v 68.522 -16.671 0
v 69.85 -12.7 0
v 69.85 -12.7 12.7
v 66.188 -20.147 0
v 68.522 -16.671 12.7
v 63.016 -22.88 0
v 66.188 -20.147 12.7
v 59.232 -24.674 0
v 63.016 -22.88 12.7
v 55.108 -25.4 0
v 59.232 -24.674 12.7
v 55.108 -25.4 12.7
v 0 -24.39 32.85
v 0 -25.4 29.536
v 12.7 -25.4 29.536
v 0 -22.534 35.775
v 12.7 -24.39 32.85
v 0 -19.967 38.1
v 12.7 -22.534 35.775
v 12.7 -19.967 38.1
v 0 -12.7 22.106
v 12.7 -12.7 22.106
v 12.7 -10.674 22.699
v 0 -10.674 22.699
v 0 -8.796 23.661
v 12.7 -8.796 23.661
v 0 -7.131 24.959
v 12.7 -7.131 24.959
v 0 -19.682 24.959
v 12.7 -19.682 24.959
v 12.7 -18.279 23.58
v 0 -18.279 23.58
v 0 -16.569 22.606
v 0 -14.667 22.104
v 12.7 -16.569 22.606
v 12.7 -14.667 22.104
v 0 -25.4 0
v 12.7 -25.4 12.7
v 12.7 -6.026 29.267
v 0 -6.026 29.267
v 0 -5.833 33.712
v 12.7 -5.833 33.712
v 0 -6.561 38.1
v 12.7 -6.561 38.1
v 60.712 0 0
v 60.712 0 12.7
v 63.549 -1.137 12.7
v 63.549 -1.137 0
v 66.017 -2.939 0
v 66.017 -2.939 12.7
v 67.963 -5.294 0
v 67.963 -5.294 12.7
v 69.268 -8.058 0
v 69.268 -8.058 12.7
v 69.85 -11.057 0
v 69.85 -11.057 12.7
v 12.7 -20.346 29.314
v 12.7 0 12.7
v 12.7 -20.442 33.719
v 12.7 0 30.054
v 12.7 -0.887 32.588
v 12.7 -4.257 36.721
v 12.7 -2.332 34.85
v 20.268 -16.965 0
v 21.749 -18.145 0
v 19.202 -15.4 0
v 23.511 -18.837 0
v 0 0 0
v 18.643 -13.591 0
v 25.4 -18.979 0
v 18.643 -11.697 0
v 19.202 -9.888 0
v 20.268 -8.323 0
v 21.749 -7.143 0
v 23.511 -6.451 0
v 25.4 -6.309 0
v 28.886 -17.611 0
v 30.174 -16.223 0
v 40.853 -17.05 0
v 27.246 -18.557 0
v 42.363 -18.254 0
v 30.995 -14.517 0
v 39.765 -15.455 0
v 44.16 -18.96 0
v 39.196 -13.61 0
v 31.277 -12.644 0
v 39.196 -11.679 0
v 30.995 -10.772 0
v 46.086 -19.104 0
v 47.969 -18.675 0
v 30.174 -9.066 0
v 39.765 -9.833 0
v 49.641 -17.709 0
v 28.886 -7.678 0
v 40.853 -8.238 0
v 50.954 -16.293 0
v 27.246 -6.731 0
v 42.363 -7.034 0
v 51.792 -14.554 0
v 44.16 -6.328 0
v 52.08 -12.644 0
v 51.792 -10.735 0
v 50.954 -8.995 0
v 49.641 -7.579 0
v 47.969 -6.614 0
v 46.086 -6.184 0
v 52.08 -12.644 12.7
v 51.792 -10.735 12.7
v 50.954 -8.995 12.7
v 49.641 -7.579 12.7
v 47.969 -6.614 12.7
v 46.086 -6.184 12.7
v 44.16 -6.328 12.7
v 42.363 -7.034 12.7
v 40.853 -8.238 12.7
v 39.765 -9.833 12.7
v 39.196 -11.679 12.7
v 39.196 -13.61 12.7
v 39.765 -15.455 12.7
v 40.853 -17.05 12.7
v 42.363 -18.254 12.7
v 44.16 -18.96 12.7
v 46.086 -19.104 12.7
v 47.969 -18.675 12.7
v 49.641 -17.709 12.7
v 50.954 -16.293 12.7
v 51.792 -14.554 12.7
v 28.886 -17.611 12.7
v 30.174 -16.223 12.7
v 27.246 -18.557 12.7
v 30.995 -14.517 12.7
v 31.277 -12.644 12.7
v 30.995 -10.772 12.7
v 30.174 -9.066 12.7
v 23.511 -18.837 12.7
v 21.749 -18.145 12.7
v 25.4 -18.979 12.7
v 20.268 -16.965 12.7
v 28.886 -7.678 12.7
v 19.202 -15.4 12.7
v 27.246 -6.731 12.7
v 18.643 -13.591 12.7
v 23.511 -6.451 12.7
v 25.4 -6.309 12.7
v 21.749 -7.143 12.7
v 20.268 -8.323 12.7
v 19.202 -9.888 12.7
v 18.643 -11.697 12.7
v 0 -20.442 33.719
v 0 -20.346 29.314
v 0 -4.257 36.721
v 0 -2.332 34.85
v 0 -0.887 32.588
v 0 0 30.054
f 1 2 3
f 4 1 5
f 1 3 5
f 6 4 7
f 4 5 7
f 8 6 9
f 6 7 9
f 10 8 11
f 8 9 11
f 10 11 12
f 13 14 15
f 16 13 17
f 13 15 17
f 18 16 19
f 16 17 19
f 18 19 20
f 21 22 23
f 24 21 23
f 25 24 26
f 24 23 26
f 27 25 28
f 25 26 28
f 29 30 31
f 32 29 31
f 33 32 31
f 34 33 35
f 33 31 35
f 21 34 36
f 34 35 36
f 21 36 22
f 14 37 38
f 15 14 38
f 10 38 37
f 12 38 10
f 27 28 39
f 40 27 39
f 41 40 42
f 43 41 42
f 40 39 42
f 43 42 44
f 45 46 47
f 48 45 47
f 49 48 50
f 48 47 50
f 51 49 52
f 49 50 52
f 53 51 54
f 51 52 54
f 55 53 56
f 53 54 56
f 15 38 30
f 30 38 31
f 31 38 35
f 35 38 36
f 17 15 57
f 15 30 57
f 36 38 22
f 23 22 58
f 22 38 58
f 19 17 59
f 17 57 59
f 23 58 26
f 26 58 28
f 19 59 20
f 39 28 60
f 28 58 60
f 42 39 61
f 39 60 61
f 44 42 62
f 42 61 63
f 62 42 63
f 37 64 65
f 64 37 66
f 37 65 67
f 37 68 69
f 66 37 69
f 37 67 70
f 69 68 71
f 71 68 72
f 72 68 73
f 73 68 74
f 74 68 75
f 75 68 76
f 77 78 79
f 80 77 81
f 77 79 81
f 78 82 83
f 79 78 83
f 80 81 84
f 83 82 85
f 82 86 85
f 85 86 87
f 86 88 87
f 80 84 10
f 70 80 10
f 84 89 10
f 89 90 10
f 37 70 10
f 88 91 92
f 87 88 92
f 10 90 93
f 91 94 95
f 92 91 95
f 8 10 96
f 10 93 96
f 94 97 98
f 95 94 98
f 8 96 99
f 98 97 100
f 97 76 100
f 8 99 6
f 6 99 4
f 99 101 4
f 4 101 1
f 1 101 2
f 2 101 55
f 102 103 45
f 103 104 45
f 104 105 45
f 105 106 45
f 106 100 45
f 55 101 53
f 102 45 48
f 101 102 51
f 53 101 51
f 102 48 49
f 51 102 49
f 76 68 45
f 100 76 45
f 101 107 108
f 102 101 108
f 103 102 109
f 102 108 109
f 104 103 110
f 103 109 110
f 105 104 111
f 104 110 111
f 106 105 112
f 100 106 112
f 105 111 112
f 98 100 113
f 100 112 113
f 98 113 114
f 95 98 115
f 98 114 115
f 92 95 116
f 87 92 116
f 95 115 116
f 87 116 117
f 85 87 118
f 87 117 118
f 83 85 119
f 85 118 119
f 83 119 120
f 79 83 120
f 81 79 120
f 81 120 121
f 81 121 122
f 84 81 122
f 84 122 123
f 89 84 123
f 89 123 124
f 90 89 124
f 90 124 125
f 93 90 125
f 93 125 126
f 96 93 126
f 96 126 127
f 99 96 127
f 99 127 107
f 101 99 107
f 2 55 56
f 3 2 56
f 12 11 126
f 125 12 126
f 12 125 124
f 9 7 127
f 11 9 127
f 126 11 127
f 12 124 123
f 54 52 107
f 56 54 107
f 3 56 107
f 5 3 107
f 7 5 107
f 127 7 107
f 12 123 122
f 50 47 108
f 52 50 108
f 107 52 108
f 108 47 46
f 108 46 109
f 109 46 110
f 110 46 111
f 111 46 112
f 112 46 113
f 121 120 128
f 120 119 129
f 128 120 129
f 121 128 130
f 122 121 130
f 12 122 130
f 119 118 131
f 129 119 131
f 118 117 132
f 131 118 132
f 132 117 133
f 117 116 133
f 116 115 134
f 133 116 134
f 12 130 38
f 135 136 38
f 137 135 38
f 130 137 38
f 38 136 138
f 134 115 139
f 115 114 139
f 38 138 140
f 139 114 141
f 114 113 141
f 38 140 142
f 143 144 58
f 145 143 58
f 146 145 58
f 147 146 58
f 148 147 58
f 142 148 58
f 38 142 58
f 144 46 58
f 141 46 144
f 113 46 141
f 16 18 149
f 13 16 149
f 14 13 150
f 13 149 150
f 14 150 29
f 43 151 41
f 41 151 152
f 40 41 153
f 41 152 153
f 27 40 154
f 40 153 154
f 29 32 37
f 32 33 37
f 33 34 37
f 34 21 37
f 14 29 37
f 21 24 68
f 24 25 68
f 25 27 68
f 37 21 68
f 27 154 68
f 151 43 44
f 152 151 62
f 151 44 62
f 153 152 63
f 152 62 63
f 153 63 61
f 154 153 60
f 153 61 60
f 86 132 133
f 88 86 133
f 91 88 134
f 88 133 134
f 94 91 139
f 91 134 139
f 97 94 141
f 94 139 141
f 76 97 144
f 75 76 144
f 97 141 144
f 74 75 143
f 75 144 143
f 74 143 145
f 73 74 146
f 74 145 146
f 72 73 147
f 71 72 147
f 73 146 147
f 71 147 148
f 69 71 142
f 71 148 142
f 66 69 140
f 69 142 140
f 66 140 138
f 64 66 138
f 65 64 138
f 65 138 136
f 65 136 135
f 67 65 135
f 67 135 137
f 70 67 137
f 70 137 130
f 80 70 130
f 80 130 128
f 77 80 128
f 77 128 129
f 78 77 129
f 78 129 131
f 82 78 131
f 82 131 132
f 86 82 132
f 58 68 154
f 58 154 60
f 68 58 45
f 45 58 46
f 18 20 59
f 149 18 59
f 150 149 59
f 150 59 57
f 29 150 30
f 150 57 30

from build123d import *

# Parameters (mm, degrees)
F1_DEPTH = 25.4
F3_DEPTH = 25.4
F5_DEPTH = 25.4
F7_DEPTH = 25.4
F8_R     = 6.3524650116
F8_R_2   = 6.4782695501
F9_DEPTH = 25.4


with BuildPart() as f1:
    # F0 (on Front) → F1 (new body)
    with BuildSketch(Plane.XZ):
        Polygon((0, 38.1), (0, 0), (69.85, 0), (69.85, 12.7), (12.7, 12.7), (12.7, 38.1), align=None)
    extrude(amount=F1_DEPTH)

    # F2 (on face) → F3 (cut)
    with BuildSketch(Plane.XY.offset(12.7)):
        with BuildLine():
            ThreePointArc((69.85, -12.7), (64.6936030033, -21.620488158), (55.1082585024, -25.4))
            Line((55.1082585024, -25.4), (69.85, -25.4))
            Line((69.85, -25.4), (69.85, -12.7))
        make_face()
        with BuildLine():
            ThreePointArc((60.7121499118, 0), (67.063378566, -4.0558500097), (69.85, -11.0574759425))
            Line((69.85, -11.0574759425), (69.85, 0))
            Line((69.85, 0), (60.7121499118, 0))
        make_face()
    extrude(amount=-F3_DEPTH, mode=Mode.SUBTRACT)

    # F4 (on face) → F5 (cut)
    with BuildSketch(Plane.YZ.offset(12.7)):
        with BuildLine():
            ThreePointArc((-12.7, 22.1061483026), (-9.7123568594, 23.1357247682), (-7.1310154162, 24.958556518))
            ThreePointArc((-7.1310154162, 24.958556518), (-5.8144018077, 31.4845054838), (-6.5605342388, 38.1))
            Line((-6.5605342388, 38.1), (-19.9668444693, 38.1))
            ThreePointArc((-19.9668444693, 38.1), (-20.4652180352, 31.5153652578), (-19.6816045791, 24.958556518))
            ThreePointArc((-19.6816045791, 24.958556518), (-16.5691552263, 22.6062890993), (-12.7, 22.1061483026))
        make_face()
    extrude(amount=-F5_DEPTH, mode=Mode.SUBTRACT)

    # F6 (on face) → F7 (cut)
    with BuildSketch(Plane.YZ.offset(12.7)):
        with BuildLine():
            ThreePointArc((-25.4, 29.5361254617), (-23.5608826076, 34.3747475185), (-19.9668444693, 38.1))
            Line((-19.9668444693, 38.1), (-25.4, 38.1))
            Line((-25.4, 38.1), (-25.4, 29.5361254617))
        make_face()
        with BuildLine():
            Line((0, 38.1), (-6.5605342388, 38.1))
            ThreePointArc((-6.5605342388, 38.1), (-2.3318615541, 34.8502011083), (0, 30.0538183876))
            Line((0, 30.0538183876), (0, 38.1))
        make_face()
    extrude(amount=-F7_DEPTH, mode=Mode.SUBTRACT)

    # F8 (on face) → F9 (cut)
    with BuildSketch(Plane.XY.offset(12.7)):
        with Locations((24.9249059707, -12.6440813765)):
            Circle(F8_R)
        with Locations((45.6017628312, -12.6440813765)):
            Circle(F8_R_2)
    extrude(amount=-F9_DEPTH, mode=Mode.SUBTRACT)


solid = f1.part
